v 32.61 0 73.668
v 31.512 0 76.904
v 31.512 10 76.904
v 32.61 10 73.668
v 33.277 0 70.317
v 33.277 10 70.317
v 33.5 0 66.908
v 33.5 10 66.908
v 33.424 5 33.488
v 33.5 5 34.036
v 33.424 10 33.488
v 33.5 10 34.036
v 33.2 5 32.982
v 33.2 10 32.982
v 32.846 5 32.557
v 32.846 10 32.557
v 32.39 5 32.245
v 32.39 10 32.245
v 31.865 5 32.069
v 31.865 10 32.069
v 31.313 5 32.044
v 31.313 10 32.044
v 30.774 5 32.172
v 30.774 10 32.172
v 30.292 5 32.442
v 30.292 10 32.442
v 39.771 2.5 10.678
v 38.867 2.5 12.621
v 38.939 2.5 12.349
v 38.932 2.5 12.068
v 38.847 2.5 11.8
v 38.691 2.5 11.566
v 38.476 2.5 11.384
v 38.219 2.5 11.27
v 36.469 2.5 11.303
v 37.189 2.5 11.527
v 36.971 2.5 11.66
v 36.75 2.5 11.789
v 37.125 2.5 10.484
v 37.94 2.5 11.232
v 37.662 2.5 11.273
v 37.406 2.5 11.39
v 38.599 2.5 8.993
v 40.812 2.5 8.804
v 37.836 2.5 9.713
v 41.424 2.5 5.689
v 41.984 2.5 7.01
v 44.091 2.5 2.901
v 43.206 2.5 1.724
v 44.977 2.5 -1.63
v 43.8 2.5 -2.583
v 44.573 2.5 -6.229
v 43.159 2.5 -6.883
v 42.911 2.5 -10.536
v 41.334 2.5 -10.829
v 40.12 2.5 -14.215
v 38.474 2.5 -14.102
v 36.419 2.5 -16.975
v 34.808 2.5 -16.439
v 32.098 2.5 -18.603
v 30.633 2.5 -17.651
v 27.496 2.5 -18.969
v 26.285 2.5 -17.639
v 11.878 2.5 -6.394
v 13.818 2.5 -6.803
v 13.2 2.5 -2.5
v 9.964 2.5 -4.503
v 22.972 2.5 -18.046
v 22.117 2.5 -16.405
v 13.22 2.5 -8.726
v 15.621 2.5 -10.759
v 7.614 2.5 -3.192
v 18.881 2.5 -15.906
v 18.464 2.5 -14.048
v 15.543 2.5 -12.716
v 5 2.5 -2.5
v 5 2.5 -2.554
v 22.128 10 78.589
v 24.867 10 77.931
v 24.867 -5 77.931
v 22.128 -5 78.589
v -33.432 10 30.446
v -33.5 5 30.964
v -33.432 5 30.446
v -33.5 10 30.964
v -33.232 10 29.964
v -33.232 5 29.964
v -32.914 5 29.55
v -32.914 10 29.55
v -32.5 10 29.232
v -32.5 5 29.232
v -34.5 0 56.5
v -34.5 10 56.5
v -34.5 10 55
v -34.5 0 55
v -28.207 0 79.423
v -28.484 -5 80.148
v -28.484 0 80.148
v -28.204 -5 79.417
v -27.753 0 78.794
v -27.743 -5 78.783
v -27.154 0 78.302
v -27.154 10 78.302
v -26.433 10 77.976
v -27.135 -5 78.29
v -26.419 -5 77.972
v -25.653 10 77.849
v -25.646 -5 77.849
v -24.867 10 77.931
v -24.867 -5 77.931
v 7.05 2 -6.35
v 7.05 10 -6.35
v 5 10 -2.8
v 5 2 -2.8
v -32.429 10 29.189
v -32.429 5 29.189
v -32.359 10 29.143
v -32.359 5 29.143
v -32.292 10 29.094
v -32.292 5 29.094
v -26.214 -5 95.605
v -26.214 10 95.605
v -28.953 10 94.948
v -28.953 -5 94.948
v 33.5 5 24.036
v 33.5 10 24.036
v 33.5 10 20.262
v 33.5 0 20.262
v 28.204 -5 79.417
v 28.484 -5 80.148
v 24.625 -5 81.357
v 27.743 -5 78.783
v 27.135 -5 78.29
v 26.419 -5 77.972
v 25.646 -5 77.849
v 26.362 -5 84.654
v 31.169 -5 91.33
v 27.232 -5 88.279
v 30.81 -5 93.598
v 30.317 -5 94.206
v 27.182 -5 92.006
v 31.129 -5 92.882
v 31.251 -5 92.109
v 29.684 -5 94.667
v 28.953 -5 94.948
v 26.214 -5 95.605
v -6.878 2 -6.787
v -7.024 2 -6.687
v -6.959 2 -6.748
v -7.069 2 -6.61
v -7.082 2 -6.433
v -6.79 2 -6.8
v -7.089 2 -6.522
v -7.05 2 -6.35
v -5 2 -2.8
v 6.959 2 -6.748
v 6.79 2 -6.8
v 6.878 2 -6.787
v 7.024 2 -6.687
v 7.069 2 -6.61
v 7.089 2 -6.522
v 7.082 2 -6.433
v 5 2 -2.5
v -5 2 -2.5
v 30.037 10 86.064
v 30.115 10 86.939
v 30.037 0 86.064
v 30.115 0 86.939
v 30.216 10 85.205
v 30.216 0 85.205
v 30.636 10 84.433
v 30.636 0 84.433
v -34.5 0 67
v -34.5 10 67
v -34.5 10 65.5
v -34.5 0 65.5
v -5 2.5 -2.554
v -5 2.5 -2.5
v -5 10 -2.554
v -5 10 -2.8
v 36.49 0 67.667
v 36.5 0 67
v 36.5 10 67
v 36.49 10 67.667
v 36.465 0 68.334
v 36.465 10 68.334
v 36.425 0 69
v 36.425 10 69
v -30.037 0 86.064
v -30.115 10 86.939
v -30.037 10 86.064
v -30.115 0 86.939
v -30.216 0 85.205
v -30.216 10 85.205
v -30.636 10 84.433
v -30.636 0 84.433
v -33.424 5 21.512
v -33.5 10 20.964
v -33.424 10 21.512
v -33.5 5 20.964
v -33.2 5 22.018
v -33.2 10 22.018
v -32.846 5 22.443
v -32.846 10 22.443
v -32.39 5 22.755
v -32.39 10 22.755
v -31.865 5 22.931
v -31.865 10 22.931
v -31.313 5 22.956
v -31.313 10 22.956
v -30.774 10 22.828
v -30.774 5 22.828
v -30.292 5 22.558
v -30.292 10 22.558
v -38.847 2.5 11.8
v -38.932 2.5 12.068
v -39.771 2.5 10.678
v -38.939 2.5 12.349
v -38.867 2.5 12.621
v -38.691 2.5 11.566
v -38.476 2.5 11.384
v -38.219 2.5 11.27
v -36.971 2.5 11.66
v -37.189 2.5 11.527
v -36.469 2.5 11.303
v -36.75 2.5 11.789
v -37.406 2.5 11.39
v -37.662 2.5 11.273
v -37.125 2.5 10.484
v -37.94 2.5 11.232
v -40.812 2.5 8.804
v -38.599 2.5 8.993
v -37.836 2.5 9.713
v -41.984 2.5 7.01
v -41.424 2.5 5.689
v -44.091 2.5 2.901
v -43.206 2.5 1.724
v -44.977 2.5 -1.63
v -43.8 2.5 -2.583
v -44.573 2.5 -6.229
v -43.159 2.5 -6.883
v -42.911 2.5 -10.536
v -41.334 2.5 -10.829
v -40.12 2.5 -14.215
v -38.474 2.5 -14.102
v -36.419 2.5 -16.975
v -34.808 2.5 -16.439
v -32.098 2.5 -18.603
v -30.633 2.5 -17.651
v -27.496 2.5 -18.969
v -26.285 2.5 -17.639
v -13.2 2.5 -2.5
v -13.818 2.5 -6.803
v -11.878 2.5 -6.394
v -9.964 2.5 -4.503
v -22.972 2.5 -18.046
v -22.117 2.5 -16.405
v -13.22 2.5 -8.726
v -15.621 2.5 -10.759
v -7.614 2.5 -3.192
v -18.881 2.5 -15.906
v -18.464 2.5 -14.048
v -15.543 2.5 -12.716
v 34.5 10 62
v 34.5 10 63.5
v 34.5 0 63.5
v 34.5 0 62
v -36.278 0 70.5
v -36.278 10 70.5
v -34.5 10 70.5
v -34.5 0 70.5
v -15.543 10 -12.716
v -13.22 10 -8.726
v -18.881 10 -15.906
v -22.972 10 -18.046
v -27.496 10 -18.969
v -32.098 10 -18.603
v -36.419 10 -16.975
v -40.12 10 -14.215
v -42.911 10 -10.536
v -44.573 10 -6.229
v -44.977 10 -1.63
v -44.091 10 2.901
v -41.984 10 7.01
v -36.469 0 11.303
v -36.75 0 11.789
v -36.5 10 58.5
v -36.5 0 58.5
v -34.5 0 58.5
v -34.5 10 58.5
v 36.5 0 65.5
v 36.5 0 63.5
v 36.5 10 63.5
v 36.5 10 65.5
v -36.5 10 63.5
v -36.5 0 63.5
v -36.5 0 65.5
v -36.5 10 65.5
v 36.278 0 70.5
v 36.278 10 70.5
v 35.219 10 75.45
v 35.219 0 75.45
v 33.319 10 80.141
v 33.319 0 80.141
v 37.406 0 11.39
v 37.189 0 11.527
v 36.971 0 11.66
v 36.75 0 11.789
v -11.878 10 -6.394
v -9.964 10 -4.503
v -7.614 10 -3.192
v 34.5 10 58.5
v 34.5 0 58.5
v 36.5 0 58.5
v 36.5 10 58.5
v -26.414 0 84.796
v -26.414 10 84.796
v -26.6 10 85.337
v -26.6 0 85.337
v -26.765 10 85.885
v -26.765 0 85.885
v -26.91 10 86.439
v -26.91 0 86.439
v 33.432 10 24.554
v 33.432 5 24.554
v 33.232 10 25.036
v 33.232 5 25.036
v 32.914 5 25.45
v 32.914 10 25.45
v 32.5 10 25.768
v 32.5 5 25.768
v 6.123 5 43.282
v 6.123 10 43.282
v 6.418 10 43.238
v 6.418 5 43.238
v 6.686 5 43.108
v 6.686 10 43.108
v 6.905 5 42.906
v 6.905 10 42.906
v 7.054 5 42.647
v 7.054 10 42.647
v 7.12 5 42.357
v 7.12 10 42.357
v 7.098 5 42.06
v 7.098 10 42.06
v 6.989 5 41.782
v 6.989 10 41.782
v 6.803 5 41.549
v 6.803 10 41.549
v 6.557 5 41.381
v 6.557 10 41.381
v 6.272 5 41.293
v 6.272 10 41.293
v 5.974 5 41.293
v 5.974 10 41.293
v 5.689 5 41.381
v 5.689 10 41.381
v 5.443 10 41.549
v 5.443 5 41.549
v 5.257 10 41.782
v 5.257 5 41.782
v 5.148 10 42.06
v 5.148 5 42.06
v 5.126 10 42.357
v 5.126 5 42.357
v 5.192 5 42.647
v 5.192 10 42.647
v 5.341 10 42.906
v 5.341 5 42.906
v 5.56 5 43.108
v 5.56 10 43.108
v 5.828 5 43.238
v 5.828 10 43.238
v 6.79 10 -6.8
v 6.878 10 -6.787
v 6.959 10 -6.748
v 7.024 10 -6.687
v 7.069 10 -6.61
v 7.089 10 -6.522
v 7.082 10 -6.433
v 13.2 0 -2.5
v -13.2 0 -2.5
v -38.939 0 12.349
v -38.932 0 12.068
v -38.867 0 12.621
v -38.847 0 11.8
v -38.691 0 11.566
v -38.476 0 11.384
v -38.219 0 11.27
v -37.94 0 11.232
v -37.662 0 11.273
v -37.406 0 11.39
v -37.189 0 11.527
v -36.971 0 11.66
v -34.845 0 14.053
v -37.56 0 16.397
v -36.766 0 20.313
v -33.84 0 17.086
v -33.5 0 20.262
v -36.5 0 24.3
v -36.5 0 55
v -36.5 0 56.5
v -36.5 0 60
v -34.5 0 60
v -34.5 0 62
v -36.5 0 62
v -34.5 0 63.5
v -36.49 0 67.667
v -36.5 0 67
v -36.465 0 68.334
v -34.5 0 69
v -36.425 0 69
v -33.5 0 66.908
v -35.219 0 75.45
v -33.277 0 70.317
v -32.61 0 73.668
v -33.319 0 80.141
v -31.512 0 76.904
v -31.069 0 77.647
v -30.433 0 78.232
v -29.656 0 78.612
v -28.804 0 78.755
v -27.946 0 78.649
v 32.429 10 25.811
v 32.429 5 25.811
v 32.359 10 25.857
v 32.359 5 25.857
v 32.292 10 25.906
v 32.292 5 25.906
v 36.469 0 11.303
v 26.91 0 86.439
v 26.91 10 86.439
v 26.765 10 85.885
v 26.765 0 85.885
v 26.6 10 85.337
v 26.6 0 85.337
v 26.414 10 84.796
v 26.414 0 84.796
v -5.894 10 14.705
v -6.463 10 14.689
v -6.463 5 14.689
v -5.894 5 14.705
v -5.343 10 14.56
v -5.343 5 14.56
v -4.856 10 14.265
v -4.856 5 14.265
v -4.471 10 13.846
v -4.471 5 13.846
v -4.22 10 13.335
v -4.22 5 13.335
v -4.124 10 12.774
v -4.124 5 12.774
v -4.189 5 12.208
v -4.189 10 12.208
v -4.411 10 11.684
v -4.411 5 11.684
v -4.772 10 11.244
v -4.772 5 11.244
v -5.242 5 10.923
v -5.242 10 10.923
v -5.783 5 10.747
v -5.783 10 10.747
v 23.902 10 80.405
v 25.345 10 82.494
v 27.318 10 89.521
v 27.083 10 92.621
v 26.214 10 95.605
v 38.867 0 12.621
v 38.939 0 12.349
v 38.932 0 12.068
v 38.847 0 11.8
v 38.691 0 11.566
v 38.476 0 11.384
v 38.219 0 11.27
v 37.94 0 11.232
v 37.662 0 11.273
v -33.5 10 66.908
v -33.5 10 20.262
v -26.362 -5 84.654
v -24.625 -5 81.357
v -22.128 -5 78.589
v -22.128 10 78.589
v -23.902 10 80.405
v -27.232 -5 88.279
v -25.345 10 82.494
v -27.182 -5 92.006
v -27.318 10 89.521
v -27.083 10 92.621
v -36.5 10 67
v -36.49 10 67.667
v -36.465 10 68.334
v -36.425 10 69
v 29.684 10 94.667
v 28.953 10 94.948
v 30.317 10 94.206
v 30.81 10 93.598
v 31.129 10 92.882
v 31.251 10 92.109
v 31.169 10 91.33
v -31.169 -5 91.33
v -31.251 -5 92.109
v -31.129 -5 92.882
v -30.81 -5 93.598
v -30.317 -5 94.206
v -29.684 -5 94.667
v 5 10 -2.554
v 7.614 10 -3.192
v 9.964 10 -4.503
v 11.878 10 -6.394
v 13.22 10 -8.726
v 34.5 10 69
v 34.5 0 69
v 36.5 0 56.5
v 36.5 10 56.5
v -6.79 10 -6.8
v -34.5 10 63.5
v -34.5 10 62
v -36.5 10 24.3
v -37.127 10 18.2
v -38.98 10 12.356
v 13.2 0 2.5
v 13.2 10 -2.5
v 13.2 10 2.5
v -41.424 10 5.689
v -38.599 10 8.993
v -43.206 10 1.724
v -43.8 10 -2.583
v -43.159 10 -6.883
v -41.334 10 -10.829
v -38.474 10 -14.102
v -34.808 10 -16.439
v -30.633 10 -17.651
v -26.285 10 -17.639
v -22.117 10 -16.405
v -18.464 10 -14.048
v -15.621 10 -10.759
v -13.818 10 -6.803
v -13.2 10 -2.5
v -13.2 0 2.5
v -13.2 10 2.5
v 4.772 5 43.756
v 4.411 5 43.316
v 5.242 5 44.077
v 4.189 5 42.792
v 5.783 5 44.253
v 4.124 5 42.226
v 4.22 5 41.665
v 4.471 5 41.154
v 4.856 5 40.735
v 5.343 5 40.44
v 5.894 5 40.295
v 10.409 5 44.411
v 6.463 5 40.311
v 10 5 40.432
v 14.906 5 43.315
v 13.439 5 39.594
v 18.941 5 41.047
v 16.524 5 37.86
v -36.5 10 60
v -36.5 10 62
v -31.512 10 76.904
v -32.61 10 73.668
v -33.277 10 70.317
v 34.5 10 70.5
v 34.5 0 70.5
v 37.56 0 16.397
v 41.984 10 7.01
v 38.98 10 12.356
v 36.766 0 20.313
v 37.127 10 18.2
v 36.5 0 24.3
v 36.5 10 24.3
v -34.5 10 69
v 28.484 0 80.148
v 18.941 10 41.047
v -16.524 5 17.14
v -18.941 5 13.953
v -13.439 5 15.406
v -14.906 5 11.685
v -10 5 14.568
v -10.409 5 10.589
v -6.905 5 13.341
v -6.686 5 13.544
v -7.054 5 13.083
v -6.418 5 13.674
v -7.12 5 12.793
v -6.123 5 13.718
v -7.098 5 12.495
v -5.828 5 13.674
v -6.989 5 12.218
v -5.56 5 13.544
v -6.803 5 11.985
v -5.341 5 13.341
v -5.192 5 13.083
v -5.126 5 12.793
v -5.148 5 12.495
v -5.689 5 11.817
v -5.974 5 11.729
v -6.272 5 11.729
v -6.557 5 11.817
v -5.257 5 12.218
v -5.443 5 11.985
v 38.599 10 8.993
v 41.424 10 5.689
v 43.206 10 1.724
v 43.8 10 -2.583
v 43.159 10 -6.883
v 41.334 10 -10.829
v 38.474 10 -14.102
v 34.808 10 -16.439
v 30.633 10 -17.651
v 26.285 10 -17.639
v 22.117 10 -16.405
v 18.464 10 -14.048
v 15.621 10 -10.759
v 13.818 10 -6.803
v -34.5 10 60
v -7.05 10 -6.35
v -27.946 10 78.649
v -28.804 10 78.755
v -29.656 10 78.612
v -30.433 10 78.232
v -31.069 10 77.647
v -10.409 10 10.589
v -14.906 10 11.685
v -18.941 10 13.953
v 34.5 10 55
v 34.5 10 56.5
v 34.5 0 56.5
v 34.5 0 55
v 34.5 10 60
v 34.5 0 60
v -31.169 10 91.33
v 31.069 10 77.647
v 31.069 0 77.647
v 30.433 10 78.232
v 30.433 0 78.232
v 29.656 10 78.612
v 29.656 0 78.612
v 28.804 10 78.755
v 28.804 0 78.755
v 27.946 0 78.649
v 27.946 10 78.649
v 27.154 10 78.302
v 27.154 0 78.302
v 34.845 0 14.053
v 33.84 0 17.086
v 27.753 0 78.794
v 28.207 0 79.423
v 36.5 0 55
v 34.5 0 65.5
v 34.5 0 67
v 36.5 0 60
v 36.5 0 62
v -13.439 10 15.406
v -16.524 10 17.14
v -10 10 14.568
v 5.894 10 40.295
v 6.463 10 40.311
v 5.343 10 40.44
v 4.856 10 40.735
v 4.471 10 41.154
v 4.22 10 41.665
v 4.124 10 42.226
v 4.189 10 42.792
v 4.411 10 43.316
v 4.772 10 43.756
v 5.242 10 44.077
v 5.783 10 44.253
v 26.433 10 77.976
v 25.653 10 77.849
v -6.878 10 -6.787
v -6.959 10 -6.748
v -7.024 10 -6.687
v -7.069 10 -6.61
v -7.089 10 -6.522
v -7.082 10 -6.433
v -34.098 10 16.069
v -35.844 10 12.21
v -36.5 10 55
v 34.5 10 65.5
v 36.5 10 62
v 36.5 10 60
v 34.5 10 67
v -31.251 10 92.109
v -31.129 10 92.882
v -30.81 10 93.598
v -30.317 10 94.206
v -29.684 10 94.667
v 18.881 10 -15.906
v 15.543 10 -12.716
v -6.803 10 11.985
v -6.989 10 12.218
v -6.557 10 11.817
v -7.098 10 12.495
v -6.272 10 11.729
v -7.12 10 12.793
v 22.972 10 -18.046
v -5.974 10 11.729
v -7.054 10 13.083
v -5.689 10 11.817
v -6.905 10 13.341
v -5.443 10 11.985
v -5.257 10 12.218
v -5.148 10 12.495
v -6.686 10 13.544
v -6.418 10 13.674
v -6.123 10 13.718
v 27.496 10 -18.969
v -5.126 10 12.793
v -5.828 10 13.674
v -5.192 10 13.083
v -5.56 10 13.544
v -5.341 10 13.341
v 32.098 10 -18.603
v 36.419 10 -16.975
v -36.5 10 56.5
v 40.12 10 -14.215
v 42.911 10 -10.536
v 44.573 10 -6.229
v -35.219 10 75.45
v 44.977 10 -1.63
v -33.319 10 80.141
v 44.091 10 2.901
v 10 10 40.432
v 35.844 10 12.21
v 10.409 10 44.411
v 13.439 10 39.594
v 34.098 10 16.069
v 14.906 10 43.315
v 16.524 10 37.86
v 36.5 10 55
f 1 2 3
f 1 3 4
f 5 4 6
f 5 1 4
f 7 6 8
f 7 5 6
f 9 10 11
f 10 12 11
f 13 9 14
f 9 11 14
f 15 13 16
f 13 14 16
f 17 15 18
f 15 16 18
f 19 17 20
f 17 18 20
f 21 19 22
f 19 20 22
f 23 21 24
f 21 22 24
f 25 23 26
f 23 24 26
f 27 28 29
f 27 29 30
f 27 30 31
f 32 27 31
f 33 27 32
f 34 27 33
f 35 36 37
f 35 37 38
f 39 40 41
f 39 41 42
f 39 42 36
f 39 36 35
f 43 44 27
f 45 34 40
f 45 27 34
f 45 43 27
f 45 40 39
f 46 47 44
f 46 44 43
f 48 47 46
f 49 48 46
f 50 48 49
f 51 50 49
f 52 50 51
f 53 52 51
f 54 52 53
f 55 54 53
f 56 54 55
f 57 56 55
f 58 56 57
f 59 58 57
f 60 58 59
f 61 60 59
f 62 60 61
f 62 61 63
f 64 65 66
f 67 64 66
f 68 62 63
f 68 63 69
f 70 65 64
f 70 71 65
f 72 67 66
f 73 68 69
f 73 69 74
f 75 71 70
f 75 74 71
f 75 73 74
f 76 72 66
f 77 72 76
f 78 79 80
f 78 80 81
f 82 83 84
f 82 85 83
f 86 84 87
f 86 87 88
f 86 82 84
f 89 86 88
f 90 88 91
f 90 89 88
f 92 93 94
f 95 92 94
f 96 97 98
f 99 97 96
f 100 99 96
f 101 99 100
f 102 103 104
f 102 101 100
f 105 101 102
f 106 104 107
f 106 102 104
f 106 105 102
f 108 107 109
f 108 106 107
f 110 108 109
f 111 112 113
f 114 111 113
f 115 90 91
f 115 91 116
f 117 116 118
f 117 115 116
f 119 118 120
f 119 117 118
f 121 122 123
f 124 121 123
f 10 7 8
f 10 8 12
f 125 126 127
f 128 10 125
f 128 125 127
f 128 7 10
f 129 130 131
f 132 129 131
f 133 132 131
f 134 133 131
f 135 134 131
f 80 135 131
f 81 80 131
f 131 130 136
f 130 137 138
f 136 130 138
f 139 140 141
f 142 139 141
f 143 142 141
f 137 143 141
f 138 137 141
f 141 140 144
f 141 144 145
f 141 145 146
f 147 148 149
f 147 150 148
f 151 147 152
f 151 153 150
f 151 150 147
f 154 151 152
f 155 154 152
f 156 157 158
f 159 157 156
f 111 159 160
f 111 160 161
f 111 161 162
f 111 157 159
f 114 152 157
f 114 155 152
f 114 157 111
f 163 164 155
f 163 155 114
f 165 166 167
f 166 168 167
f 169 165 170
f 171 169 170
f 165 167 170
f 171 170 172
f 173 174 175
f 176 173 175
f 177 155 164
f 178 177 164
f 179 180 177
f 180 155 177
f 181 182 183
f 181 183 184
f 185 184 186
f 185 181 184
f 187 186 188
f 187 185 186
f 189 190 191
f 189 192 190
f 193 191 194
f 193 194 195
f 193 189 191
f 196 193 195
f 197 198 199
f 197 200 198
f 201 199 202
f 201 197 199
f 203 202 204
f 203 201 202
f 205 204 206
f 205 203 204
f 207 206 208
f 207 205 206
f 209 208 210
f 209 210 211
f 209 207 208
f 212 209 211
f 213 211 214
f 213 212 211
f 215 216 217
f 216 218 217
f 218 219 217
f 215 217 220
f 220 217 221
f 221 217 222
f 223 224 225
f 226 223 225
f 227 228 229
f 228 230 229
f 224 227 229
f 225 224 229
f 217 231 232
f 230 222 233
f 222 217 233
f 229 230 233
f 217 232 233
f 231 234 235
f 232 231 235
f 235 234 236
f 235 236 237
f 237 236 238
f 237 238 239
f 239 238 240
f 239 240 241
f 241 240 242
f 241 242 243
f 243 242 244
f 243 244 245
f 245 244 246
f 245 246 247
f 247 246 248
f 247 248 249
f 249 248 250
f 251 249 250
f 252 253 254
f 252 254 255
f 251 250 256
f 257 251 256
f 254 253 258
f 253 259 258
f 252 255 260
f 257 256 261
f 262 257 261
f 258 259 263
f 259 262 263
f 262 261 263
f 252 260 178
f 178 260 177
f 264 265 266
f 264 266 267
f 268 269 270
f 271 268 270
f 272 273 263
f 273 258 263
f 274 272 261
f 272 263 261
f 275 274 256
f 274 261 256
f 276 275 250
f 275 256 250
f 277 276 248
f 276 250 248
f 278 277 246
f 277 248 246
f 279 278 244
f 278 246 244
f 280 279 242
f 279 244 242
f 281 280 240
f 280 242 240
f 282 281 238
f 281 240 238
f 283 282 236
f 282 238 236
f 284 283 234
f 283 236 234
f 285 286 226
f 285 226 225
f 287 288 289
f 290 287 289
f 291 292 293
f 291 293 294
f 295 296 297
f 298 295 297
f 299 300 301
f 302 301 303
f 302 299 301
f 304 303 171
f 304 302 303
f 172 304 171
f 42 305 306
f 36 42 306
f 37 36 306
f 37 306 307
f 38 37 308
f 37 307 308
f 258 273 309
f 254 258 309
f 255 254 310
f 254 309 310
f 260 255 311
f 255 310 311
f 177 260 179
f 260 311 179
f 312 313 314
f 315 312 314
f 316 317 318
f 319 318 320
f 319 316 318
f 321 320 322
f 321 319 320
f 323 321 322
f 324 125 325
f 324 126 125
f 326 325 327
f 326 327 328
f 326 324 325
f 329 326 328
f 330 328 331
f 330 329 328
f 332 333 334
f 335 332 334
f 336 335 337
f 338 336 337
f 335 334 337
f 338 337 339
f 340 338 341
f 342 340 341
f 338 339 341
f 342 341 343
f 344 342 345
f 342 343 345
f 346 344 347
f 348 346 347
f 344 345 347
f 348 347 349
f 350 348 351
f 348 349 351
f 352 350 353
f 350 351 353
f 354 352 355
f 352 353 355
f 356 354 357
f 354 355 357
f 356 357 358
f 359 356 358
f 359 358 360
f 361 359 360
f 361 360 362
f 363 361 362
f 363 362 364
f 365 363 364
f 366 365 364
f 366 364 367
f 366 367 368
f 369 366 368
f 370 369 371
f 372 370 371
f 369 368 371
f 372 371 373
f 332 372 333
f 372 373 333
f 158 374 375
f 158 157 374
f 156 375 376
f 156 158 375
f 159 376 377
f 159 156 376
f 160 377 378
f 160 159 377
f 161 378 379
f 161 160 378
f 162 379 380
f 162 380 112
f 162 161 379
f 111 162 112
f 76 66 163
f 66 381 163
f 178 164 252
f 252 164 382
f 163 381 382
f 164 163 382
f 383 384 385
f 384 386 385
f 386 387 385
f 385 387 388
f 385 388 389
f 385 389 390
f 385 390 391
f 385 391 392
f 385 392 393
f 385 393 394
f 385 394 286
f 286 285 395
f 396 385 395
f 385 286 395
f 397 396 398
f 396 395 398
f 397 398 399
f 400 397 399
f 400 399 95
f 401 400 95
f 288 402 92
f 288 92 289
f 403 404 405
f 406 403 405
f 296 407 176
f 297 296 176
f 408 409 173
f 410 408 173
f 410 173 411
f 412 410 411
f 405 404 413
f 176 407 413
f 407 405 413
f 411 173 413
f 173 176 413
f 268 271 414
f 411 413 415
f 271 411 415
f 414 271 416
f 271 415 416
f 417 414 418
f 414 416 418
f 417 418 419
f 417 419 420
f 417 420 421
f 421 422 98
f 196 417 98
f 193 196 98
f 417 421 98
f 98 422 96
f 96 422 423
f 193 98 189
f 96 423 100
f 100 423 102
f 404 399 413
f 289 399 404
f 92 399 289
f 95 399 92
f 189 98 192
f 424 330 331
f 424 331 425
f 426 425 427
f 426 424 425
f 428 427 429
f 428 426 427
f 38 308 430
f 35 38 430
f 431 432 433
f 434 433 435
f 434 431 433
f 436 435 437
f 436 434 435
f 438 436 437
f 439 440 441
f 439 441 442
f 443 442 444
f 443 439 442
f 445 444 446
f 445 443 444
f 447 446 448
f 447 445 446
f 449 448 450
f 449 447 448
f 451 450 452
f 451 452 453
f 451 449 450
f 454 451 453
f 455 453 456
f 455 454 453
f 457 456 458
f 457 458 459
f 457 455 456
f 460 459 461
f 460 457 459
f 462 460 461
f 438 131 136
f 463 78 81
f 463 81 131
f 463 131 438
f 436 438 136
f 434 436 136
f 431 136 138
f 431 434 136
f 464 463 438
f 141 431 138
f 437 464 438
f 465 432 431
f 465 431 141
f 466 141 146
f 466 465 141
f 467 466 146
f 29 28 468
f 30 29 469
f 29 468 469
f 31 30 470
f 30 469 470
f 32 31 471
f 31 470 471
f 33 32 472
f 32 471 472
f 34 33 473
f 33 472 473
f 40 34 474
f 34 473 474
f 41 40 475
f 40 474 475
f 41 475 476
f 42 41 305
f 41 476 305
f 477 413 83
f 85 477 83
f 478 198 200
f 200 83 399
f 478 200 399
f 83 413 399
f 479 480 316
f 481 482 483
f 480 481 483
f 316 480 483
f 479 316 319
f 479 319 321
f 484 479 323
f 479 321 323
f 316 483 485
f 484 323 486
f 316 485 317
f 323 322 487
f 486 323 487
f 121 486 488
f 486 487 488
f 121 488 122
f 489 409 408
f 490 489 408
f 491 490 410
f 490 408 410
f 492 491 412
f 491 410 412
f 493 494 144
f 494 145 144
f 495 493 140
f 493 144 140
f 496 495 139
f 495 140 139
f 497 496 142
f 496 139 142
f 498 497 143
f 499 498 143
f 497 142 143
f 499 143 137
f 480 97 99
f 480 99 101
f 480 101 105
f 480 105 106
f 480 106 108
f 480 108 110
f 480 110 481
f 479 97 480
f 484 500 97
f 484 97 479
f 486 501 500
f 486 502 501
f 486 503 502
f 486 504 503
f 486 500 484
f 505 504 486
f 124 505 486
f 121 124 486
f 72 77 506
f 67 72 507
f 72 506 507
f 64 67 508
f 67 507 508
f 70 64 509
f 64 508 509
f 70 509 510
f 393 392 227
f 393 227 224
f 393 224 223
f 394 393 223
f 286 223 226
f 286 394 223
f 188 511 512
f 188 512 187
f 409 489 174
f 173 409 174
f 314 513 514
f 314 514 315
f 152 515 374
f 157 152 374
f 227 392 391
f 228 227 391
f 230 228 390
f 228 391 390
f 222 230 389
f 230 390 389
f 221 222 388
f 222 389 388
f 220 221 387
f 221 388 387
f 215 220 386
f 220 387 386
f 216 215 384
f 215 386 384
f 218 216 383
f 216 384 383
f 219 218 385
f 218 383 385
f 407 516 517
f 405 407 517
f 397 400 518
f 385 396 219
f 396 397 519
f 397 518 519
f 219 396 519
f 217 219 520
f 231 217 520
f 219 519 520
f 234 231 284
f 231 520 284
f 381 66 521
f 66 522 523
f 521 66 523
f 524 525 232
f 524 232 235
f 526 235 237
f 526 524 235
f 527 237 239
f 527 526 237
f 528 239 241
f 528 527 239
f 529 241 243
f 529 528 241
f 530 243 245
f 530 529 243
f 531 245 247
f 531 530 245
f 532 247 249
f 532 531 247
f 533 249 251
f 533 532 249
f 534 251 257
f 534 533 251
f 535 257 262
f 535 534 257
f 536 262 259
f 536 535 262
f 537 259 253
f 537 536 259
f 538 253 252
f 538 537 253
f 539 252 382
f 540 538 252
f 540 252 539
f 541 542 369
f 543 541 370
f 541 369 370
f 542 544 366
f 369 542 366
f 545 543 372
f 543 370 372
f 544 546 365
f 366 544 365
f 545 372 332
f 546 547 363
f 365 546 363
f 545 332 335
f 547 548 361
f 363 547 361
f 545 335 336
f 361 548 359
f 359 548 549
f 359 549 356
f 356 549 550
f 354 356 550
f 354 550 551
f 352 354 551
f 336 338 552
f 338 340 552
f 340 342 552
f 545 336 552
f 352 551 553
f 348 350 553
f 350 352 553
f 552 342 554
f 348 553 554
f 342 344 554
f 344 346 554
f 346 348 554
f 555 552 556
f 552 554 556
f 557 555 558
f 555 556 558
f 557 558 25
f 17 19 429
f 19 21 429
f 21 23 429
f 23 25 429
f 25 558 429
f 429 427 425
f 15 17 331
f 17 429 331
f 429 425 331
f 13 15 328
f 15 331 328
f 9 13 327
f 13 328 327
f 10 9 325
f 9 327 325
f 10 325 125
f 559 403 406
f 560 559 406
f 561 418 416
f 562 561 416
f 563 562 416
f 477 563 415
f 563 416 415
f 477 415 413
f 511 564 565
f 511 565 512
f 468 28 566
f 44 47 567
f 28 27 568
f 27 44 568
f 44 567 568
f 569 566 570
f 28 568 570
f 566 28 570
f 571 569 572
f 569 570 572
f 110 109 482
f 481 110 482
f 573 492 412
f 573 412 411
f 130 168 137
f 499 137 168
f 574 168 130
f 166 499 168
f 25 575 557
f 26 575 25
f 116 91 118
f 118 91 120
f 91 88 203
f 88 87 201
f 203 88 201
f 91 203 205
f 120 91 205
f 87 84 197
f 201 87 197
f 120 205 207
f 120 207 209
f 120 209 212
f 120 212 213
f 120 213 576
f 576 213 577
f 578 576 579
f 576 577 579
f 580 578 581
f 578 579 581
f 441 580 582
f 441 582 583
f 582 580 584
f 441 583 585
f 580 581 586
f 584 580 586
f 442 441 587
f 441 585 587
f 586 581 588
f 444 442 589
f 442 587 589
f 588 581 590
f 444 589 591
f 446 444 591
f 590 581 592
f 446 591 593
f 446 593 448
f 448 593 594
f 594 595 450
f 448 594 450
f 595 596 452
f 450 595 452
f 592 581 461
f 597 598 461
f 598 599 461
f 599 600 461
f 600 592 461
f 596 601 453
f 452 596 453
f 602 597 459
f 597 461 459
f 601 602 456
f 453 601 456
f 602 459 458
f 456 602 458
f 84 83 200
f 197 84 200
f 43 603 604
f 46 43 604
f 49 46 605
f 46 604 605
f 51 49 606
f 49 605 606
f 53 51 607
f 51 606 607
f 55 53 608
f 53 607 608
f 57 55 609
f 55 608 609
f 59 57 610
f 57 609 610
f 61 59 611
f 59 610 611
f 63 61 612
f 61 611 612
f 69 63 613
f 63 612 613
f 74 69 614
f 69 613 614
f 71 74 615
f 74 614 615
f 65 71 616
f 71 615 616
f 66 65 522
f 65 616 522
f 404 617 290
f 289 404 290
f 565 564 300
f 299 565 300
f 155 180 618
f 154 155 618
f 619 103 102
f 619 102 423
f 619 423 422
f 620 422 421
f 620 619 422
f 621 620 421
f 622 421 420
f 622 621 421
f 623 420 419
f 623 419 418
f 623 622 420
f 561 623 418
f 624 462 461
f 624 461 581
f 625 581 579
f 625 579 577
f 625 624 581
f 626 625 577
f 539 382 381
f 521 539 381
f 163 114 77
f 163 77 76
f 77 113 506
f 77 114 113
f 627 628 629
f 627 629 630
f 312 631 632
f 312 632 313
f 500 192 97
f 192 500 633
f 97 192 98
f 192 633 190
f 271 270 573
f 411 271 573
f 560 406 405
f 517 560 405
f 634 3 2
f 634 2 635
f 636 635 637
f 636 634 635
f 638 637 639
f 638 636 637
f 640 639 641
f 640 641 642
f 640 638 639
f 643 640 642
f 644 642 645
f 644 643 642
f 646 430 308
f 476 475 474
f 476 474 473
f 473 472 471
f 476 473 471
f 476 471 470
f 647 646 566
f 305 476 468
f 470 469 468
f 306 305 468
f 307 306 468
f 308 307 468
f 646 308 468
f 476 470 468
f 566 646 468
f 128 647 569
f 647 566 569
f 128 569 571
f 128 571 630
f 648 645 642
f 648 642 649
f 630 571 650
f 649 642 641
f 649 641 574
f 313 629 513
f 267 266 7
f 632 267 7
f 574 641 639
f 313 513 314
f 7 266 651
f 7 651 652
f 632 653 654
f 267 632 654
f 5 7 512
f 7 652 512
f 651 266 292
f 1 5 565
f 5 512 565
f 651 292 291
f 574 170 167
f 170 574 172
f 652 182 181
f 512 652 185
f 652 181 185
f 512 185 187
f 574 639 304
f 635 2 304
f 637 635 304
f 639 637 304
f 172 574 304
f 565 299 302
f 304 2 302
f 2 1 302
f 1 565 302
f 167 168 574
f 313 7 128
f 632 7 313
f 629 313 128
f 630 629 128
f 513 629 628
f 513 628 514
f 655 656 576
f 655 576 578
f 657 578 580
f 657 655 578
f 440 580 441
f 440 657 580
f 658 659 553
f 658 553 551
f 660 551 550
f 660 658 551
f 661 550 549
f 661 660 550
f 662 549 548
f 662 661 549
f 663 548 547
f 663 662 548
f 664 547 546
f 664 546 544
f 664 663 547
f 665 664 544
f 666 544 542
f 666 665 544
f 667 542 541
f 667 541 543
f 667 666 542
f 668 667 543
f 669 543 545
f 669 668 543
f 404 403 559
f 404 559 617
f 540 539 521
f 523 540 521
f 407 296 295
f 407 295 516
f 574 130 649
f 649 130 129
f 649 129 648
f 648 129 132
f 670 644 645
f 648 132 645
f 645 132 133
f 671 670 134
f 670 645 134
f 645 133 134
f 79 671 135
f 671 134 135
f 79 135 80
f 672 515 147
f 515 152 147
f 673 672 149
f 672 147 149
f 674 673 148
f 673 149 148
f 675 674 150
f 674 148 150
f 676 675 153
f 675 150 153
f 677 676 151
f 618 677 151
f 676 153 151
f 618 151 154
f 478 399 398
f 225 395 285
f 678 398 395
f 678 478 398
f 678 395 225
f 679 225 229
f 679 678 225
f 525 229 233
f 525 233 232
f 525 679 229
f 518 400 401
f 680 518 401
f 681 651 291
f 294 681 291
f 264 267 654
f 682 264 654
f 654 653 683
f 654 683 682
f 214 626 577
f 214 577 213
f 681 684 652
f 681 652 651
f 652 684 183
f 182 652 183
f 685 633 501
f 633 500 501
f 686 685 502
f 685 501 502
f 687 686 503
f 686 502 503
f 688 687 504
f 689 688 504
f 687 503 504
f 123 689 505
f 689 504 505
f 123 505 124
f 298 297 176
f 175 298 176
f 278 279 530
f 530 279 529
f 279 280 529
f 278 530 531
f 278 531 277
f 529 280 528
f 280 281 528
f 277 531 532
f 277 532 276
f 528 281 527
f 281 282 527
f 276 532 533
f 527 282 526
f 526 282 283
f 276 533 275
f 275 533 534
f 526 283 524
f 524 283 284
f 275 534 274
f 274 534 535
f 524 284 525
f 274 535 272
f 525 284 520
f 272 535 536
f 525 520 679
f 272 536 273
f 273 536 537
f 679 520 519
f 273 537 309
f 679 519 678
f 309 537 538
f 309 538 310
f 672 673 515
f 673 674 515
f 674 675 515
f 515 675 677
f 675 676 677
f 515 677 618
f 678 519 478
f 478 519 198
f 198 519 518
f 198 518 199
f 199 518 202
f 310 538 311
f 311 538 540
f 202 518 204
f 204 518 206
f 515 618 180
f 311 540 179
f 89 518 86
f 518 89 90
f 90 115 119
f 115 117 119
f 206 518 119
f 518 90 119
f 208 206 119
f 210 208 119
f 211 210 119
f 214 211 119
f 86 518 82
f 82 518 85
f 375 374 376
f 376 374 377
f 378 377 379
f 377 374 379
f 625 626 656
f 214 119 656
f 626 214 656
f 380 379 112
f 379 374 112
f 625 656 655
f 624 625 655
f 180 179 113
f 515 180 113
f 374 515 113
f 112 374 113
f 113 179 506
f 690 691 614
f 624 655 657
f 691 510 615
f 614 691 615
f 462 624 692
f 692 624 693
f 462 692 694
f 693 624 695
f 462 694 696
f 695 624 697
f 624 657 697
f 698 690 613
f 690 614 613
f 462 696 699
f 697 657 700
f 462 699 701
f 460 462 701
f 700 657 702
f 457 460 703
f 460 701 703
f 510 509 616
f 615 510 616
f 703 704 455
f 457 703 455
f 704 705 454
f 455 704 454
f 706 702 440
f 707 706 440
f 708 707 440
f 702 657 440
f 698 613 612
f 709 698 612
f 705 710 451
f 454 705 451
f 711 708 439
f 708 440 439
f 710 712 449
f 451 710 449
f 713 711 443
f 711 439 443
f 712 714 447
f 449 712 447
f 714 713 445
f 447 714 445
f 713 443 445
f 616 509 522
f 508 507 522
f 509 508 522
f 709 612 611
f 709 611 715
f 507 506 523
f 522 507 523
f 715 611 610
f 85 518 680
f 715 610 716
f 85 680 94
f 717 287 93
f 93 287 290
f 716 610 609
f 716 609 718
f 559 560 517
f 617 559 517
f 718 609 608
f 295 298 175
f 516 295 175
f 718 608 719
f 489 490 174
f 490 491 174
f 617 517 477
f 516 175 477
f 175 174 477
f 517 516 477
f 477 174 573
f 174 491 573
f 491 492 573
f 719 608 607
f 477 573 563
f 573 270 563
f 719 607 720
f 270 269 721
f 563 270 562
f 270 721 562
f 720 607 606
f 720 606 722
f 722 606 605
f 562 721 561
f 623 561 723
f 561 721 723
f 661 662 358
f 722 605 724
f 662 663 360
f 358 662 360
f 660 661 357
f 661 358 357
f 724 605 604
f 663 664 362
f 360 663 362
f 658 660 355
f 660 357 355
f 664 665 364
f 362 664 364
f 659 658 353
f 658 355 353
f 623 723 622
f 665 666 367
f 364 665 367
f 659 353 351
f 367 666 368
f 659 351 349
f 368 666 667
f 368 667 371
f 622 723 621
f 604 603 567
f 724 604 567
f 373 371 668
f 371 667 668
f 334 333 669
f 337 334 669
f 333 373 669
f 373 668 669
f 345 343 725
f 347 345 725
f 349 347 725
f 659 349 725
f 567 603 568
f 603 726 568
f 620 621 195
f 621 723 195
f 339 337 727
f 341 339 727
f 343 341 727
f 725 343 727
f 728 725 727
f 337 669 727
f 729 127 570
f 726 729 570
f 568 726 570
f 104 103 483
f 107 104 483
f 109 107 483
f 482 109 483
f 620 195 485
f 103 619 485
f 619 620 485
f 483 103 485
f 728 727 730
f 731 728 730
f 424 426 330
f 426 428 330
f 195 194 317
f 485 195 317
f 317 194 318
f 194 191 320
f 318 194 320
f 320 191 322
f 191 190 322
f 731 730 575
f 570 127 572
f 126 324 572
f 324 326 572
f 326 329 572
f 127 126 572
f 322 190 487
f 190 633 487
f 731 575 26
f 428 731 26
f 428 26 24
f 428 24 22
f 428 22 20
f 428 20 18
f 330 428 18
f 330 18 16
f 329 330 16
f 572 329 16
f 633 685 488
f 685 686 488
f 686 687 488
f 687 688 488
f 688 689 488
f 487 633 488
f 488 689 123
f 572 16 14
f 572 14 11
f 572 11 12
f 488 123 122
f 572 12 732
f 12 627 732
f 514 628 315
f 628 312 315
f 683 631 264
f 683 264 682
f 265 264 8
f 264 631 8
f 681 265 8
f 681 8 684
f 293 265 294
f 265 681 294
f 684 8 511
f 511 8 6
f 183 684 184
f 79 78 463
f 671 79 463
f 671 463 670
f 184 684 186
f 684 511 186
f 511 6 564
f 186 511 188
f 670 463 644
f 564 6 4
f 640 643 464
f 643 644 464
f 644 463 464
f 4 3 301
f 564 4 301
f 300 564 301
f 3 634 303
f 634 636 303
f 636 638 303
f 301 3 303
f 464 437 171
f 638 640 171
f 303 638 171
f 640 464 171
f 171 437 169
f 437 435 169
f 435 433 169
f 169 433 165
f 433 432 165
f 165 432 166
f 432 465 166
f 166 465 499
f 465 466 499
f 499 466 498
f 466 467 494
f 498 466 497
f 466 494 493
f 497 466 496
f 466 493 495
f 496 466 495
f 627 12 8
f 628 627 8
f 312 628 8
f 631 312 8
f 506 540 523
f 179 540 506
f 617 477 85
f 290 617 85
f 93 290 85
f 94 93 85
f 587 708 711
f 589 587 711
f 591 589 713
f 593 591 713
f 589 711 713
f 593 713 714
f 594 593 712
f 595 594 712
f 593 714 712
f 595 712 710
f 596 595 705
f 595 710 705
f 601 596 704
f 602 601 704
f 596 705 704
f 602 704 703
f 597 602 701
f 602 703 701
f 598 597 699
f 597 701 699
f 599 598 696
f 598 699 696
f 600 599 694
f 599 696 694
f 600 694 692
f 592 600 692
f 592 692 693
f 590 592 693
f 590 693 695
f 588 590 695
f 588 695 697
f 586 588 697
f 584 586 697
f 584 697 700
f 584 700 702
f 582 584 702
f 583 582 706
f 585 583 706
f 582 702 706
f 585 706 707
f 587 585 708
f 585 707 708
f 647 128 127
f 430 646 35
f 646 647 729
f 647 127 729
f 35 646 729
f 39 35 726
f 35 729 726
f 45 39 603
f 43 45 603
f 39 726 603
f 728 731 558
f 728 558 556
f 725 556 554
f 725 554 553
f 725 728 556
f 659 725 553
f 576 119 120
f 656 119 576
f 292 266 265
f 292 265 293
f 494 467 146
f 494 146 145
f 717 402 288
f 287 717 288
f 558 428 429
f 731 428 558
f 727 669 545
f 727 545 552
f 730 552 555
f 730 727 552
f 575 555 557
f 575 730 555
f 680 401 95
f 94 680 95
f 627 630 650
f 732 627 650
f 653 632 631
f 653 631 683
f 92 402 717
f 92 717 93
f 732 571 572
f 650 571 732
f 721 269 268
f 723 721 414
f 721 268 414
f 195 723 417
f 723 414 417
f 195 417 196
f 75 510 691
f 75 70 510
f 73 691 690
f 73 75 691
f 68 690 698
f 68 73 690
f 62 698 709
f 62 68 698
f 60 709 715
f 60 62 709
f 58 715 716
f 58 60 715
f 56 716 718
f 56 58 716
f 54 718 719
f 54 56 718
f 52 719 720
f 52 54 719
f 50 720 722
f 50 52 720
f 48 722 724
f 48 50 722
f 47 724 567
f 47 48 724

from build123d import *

# Parameters (mm, degrees)
BOSS_EXTRUDE1_DEPTH = 10
FILLET2_R           = 30
SKETCH6_R           = 1
BOSS_EXTRUDE2_DEPTH = 5
SKETCH4_W           = 2
SKETCH4_H           = 1.5
CUT_EXTRUDE1_DEPTH  = 99.900202224
FILLET3_R           = 15
CUT_REVOLVE1_START  = -1
CUT_REVOLVE1_DEPTH  = 3.5
FILLET1_R           = 10
FILLET4_R           = 1
FILLET5_R           = 2
BOSS_EXTRUDE3_START = -10
BOSS_EXTRUDE3_DEPTH = 15
DELETEFACE1_DEPTH   = 11
FILLET6_R           = 3
FILLET7_R           = 3
BOSS_EXTRUDE4_START = -10
SKETCH11_W          = 10
SKETCH11_H          = 0.3
BOSS_EXTRUDE4_DEPTH = 8
FILLET8_R           = 0.3


with BuildPart() as part:
    # Sketch2 → Boss-Extrude1 (new body)
    with BuildSketch(Plane(origin=(0, 0, 0), x_dir=(1, 0, 0), z_dir=(0, 1, 0))):
        with BuildLine():
            Line((-15, 2.5), (-15, -2.5))
            Line((-15, -2.5), (15, -2.5))
            Line((15, -2.5), (15, 2.5))
            Line((15, 2.5), (-12, 2.5))
            ThreePointArc((-12, 2.5), (-36.874067112, 16.717067208), (-36.5, -11.93086969))
            Line((-36.5, -11.93086969), (-36.5, -66.907529531))
            ThreePointArc((-36.5, -66.907529531), (-34.28320825, -78.052094241), (-27.970319449, -87.5))
            Line((-27.970319449, -87.5), (-25.848999105, -85.378679656))
            ThreePointArc((-25.848999105, -85.378679656), (-31.511569653, -76.904043944), (-33.5, -66.907529531))
            Line((-33.5, -66.907529531), (-33.5, -10.039936204))
            ThreePointArc((-33.5, -10.039936204), (-36.074628704, 13.674748319), (-15, 2.5))
        make_face()
    boss_extrude1 = extrude(amount=BOSS_EXTRUDE1_DEPTH)

    # Mirror2: Boss-Extrude1 across plane
    add(boss_extrude1.mirror(Plane(origin=(0, 0, 0), x_dir=(0, 0, 1), z_dir=(1, 0, 0))))

    # Fillet2
    fillet2_edges = [part.edges().sort_by_distance(p)[0] for p in [
        (-36.5, 5, 11.93086969),
        (36.5, 5, 11.93086969),
    ]]
    fillet(fillet2_edges, radius=FILLET2_R)

    # Sketch6 → Boss-Extrude2 (add)
    # profile 1 of 2: a face of its own
    with BuildSketch(Plane(origin=(0, 10, 0), x_dir=(1, 0, 0), z_dir=(0, 1, 0))):
        with BuildLine():
            Line((-32.29175747, -29.0937848), (-16.524124365, -17.1403988))
            ThreePointArc((-16.524124365, -17.1403988), (-11.748018495, -14.869514069), (-6.462616651, -14.688870483))
            ThreePointArc((-6.462616651, -14.688870483), (-4.151991915, -13.057609213), (-5.783253184, -10.746984477))
            ThreePointArc((-5.783253184, -10.746984477), (-12.694932518, -10.983210705), (-18.940609425, -13.9528292))
            Line((-18.940609425, -13.9528292), (-34.70824253, -25.9062152))
            ThreePointArc((-34.70824253, -25.9062152), (-35.0937848, -28.70824253), (-32.29175747, -29.0937848))
        make_face()
        with Locations(Location((-6.122934918, -12.71792748, 0), (0, 0, 270))):
            Circle(SKETCH6_R, mode=Mode.SUBTRACT)
    # profile 2 of 2: a face of its own
    with BuildSketch(Plane(origin=(0, 10, 0), x_dir=(1, 0, 0), z_dir=(0, 1, 0))):
        with BuildLine():
            Line((32.29175747, -25.9062152), (16.524124365, -37.8596012))
            ThreePointArc((16.524124365, -37.8596012), (11.748018495, -40.130485931), (6.462616651, -40.311129517))
            ThreePointArc((6.462616651, -40.311129517), (4.151991915, -41.942390787), (5.783253184, -44.253015523))
            ThreePointArc((5.783253184, -44.253015523), (12.694932518, -44.016789295), (18.940609425, -41.0471708))
            Line((18.940609425, -41.0471708), (34.70824253, -29.0937848))
            ThreePointArc((34.70824253, -29.0937848), (35.0937848, -26.29175747), (32.29175747, -25.9062152))
        make_face()
        with Locations(Location((6.122934918, -42.28207252, 0), (0, 0, 270))):
            Circle(SKETCH6_R, mode=Mode.SUBTRACT)
    extrude(amount=-BOSS_EXTRUDE2_DEPTH)

    # Sketch4 → Cut-Extrude1 (cut, through all)
    with BuildSketch(Plane(origin=(0, 10, 0), x_dir=(1, 0, 0), z_dir=(0, 1, 0))):
        with BuildLine():
            Line((-13.2, 2.5), (-13.2, -2.5))
            Line((-13.2, -2.5), (-14.040055325, -2.5))
            ThreePointArc((-14.040055325, -2.5), (-43.588524672, 5.0350391), (-13.2, 2.5))
        make_face()
        with Locations((-35.5, -59.25)):
            Rectangle(SKETCH4_W, SKETCH4_H)
        with Locations((-35.5, -62.75)):
            Rectangle(SKETCH4_W, SKETCH4_H)
        with Locations((-35.5, -55.75)):
            Rectangle(SKETCH4_W, SKETCH4_H)
        with Locations((-35.5, -66.25)):
            Rectangle(SKETCH4_W, SKETCH4_H)
        with Locations((-35.5, -69.75)):
            Rectangle(SKETCH4_W, SKETCH4_H)
        with Locations((35.5, -69.75)):
            Rectangle(SKETCH4_W, SKETCH4_H)
        with Locations((35.5, -66.25)):
            Rectangle(SKETCH4_W, SKETCH4_H)
        with Locations((35.5, -62.75)):
            Rectangle(SKETCH4_W, SKETCH4_H)
        with Locations((35.5, -55.75)):
            Rectangle(SKETCH4_W, SKETCH4_H)
        with Locations((35.5, -59.25)):
            Rectangle(SKETCH4_W, SKETCH4_H)
        with BuildLine():
            Line((13.2, -2.5), (14.040055325, -2.5))
            ThreePointArc((14.040055325, -2.5), (43.588524672, 5.0350391), (13.2, 2.5))
            Line((13.2, 2.5), (13.2, -2.5))
        make_face()
    extrude(amount=-CUT_EXTRUDE1_DEPTH, mode=Mode.SUBTRACT)

    # Fillet3
    fillet3_edges = [part.edges().sort_by_distance(p)[0] for p in [
        (33.5, 5, 11.959944675),
        (-33.5, 5, 11.959944675),
    ]]
    fillet(fillet3_edges, radius=FILLET3_R)

    # Cut-Revolve1: read off the stored shape, not the designer's step
    # Cut-Revolve1 outline → Cut-Revolve1 (cut)
    with BuildSketch(Plane(origin=(0, 0, 0), x_dir=(1, 0, 0), z_dir=(0, 1, 0)).offset(CUT_REVOLVE1_START)):
        with BuildLine():
            ThreePointArc((-41.983870968, -7.00974362), (-39.626617248, -9.683939782), (-36.75, -11.789419162))
            Line((-36.75, -11.789419162), (-36.469117037, -11.3029156))
            ThreePointArc((-36.469117037, -11.3029156), (-37.473434742, -10.092280811), (-38.599009901, -8.993476368))
            ThreePointArc((-38.599009901, -8.993476368), (-34.807739235, 16.439240501), (-13.2, 2.5))
            Line((-13.2, 2.5), (-12, 2.5))
            ThreePointArc((-12, 2.5), (-33.488292745, 18.227903086), (-41.983870968, -7.00974362))
        make_face()
    cut_revolve1 = extrude(amount=CUT_REVOLVE1_DEPTH, mode=Mode.SUBTRACT)

    # Mirror3: Cut-Revolve1 across plane
    add(cut_revolve1.mirror(Plane(origin=(0, 0, 0), x_dir=(0, 0, 1), z_dir=(1, 0, 0))), mode=Mode.SUBTRACT)

    # Fillet1
    fillet1_edges = [part.edges().sort_by_distance(p)[0] for p in [
        (-12, 6.25, -2.5),
        (12, 6.25, -2.5),
    ]]
    fillet(fillet1_edges, radius=FILLET1_R)

    # Fillet4
    # the kernel refuses this fillet: 1 mm, written as the material it takes off along each edge
    with BuildSketch(Plane(origin=(41.983870968, -16.048184468, 7.00974362), x_dir=(-0.7225326531123375, 0, 0.6913367957706624), z_dir=(0, 1, 0))) as fillet4_piece_1:
        with BuildLine():
            CenterArc((6.528208905, 0.981393724), FILLET4_R, 113.353303502, 145.576812808)
            ThreePointArc((6.131809124, 1.899471723), (3.116855905, 0.785256492), (0, 0))
            ThreePointArc((0, 0), (3.168101381, 0.307003562), (6.336202761, 0))
        make_face()
    extrude(amount=18.548184468, mode=Mode.SUBTRACT)
    with BuildSketch(Plane(origin=(-41.983870968, -16.048184468, 7.00974362), x_dir=(0.7225326531123378, 0, 0.6913367957706622), z_dir=(0, 1, 0))) as fillet4_piece_2:
        with BuildLine():
            CenterArc((6.528208905, -0.981393724), FILLET4_R, 101.06988369, 145.576812808)
            ThreePointArc((6.131809124, -1.899471723), (3.116855905, -0.785256492), (0, 0))
            ThreePointArc((0, 0), (3.168101381, -0.307003562), (6.336202761, 0))
        make_face()
    extrude(amount=18.548184468, mode=Mode.SUBTRACT)

    # Fillet5
    fillet5_edges = [part.edges().sort_by_distance(p)[0] for p in [
        (-33.5, 7.5, 29.5),
        (-33.5, 7.5, 24.99025088),
        (33.5, 7.5, 25.5),
        (33.5, 7.5, 30.00974912),
    ]]
    fillet(fillet5_edges, radius=FILLET5_R)

    # Sketch8 → Boss-Extrude3 (add)
    with BuildSketch(Plane.XZ.offset(BOSS_EXTRUDE3_START)):
        with BuildLine():
            Line((-26.213914484, 95.605099549), (-31.869667291, 94.247080891))
            Line((-31.869667291, 94.247080891), (-27.783825698, 77.230738791))
            Line((-27.783825698, 77.230738791), (-22.128072891, 78.588757448))
            ThreePointArc((-22.128072891, 78.588757448), (-26.909659277, 86.439339828), (-26.213914484, 95.605099549))
        make_face()
    boss_extrude3 = extrude(amount=BOSS_EXTRUDE3_DEPTH)

    # Mirror4: Boss-Extrude3 across plane
    add(boss_extrude3.mirror(Plane(origin=(0, 0, 0), x_dir=(0, 0, 1), z_dir=(1, 0, 0))))

    # DeleteFace1: read off the stored shape, not the designer's step
    # DeleteFace1 outline → DeleteFace1 (cut)
    with BuildSketch(Plane(origin=(0, 0, 0), x_dir=(1, 0, 0), z_dir=(0, 1, 0))):
        with BuildLine():
            Line((25.848999105, -85.378679656), (26.909659277, -86.439339828))
            ThreePointArc((26.909659277, -86.439339828), (26.685366049, -85.610488056), (26.414012779, -84.795828548))
            ThreePointArc((26.414012779, -84.795828548), (26.133770133, -85.089449001), (25.848999105, -85.378679656))
        make_face()
        with BuildLine():
            Line((-26.909659277, -86.439339828), (-25.848999105, -85.378679656))
            ThreePointArc((-25.848999105, -85.378679656), (-26.133770133, -85.089449001), (-26.414012779, -84.795828548))
            ThreePointArc((-26.414012779, -84.795828548), (-26.685366049, -85.610488056), (-26.909659277, -86.439339828))
        make_face()
    extrude(amount=DELETEFACE1_DEPTH, mode=Mode.SUBTRACT)

    # Fillet6
    fillet6_edges = [part.edges().sort_by_distance(p)[0] for p in [
        (-31.869667291, 2.5, 94.247080891),
        (-29.774582906, 5, 85.521663663),
        (-27.783825698, 2.5, 77.230738791),
        (29.774582906, 5, 85.521663663),
        (27.783825698, 2.5, 77.230738791),
        (31.869667291, 2.5, 94.247080891),
    ]]
    fillet(fillet6_edges, radius=FILLET6_R)

    # Fillet7
    # the kernel refuses this fillet: 3 mm, written as the material it adds along each edge
    with BuildSketch(Plane(origin=(28.870158832, 10, 81.755000397), x_dir=(-0.4451552484524621, 0, -0.8954534073726151), z_dir=(0, -1, 0))) as fillet7_piece_1:
        with BuildLine():
            CenterArc((5.429938119, 2.554031947), FILLET7_R, 138.932760823, 99.425389741)
            Line((3.168120681, 4.524864735), (2.941938938, 4.721948013))
            ThreePointArc((2.941938938, 4.721948013), (1.218371107, 2.518472645), (-0.262566045, 0.145117443))
            Line((-0.262566045, 0.145117443), (0.067135427, -0.292391577))
            ThreePointArc((0.067135427, -0.292391577), (1.678072021, 0.077492249), (3.698732127, -0.255403195))
            Line((3.698732127, -0.255403195), (3.85611449, 0))
        make_face()
    extrude(amount=10)
    with BuildSketch(Plane(origin=(-28.870158832, 10, 81.755000397), x_dir=(-0.47821106545327013, 0, -0.8782449412766623), z_dir=(0, -1, 0))) as fillet7_piece_2:
        with BuildLine():
            CenterArc((5.206526078, 2.983185104), FILLET7_R, 176.643750304, 99.425389741)
            Line((2.21167161, 3.158817444), (1.912186163, 3.176380678))
            ThreePointArc((1.912186163, 3.176380678), (1.025936374, 1.330182436), (-0.201013248, 0.222696372))
            Line((-0.201013248, 0.222696372), (-0.031718549, -0.29831851))
            ThreePointArc((-0.031718549, -0.29831851), (2.761855785, -0.446413754), (5.55543012, -0.29831851))
            Line((5.55543012, -0.29831851), (5.523711571, 0))
        make_face()
    extrude(amount=10)

    # Sketch11 → Boss-Extrude4 (add)
    with BuildSketch(Plane.XZ.offset(BOSS_EXTRUDE4_START)):
        Polygon((-7.309401077, -6.8), (7.309401077, -6.8), (5, -2.8), (-5, -2.8), align=None)
        with Locations((0, -2.65)):
            Rectangle(SKETCH11_W, SKETCH11_H)
    extrude(amount=BOSS_EXTRUDE4_DEPTH)

    # Fillet8
    fillet8_edges = [part.edges().sort_by_distance(p)[0] for p in [
        (-7.309401077, 6, -6.8),
        (7.309401077, 6, -6.8),
    ]]
    fillet(fillet8_edges, radius=FILLET8_R)


solid = part.part
